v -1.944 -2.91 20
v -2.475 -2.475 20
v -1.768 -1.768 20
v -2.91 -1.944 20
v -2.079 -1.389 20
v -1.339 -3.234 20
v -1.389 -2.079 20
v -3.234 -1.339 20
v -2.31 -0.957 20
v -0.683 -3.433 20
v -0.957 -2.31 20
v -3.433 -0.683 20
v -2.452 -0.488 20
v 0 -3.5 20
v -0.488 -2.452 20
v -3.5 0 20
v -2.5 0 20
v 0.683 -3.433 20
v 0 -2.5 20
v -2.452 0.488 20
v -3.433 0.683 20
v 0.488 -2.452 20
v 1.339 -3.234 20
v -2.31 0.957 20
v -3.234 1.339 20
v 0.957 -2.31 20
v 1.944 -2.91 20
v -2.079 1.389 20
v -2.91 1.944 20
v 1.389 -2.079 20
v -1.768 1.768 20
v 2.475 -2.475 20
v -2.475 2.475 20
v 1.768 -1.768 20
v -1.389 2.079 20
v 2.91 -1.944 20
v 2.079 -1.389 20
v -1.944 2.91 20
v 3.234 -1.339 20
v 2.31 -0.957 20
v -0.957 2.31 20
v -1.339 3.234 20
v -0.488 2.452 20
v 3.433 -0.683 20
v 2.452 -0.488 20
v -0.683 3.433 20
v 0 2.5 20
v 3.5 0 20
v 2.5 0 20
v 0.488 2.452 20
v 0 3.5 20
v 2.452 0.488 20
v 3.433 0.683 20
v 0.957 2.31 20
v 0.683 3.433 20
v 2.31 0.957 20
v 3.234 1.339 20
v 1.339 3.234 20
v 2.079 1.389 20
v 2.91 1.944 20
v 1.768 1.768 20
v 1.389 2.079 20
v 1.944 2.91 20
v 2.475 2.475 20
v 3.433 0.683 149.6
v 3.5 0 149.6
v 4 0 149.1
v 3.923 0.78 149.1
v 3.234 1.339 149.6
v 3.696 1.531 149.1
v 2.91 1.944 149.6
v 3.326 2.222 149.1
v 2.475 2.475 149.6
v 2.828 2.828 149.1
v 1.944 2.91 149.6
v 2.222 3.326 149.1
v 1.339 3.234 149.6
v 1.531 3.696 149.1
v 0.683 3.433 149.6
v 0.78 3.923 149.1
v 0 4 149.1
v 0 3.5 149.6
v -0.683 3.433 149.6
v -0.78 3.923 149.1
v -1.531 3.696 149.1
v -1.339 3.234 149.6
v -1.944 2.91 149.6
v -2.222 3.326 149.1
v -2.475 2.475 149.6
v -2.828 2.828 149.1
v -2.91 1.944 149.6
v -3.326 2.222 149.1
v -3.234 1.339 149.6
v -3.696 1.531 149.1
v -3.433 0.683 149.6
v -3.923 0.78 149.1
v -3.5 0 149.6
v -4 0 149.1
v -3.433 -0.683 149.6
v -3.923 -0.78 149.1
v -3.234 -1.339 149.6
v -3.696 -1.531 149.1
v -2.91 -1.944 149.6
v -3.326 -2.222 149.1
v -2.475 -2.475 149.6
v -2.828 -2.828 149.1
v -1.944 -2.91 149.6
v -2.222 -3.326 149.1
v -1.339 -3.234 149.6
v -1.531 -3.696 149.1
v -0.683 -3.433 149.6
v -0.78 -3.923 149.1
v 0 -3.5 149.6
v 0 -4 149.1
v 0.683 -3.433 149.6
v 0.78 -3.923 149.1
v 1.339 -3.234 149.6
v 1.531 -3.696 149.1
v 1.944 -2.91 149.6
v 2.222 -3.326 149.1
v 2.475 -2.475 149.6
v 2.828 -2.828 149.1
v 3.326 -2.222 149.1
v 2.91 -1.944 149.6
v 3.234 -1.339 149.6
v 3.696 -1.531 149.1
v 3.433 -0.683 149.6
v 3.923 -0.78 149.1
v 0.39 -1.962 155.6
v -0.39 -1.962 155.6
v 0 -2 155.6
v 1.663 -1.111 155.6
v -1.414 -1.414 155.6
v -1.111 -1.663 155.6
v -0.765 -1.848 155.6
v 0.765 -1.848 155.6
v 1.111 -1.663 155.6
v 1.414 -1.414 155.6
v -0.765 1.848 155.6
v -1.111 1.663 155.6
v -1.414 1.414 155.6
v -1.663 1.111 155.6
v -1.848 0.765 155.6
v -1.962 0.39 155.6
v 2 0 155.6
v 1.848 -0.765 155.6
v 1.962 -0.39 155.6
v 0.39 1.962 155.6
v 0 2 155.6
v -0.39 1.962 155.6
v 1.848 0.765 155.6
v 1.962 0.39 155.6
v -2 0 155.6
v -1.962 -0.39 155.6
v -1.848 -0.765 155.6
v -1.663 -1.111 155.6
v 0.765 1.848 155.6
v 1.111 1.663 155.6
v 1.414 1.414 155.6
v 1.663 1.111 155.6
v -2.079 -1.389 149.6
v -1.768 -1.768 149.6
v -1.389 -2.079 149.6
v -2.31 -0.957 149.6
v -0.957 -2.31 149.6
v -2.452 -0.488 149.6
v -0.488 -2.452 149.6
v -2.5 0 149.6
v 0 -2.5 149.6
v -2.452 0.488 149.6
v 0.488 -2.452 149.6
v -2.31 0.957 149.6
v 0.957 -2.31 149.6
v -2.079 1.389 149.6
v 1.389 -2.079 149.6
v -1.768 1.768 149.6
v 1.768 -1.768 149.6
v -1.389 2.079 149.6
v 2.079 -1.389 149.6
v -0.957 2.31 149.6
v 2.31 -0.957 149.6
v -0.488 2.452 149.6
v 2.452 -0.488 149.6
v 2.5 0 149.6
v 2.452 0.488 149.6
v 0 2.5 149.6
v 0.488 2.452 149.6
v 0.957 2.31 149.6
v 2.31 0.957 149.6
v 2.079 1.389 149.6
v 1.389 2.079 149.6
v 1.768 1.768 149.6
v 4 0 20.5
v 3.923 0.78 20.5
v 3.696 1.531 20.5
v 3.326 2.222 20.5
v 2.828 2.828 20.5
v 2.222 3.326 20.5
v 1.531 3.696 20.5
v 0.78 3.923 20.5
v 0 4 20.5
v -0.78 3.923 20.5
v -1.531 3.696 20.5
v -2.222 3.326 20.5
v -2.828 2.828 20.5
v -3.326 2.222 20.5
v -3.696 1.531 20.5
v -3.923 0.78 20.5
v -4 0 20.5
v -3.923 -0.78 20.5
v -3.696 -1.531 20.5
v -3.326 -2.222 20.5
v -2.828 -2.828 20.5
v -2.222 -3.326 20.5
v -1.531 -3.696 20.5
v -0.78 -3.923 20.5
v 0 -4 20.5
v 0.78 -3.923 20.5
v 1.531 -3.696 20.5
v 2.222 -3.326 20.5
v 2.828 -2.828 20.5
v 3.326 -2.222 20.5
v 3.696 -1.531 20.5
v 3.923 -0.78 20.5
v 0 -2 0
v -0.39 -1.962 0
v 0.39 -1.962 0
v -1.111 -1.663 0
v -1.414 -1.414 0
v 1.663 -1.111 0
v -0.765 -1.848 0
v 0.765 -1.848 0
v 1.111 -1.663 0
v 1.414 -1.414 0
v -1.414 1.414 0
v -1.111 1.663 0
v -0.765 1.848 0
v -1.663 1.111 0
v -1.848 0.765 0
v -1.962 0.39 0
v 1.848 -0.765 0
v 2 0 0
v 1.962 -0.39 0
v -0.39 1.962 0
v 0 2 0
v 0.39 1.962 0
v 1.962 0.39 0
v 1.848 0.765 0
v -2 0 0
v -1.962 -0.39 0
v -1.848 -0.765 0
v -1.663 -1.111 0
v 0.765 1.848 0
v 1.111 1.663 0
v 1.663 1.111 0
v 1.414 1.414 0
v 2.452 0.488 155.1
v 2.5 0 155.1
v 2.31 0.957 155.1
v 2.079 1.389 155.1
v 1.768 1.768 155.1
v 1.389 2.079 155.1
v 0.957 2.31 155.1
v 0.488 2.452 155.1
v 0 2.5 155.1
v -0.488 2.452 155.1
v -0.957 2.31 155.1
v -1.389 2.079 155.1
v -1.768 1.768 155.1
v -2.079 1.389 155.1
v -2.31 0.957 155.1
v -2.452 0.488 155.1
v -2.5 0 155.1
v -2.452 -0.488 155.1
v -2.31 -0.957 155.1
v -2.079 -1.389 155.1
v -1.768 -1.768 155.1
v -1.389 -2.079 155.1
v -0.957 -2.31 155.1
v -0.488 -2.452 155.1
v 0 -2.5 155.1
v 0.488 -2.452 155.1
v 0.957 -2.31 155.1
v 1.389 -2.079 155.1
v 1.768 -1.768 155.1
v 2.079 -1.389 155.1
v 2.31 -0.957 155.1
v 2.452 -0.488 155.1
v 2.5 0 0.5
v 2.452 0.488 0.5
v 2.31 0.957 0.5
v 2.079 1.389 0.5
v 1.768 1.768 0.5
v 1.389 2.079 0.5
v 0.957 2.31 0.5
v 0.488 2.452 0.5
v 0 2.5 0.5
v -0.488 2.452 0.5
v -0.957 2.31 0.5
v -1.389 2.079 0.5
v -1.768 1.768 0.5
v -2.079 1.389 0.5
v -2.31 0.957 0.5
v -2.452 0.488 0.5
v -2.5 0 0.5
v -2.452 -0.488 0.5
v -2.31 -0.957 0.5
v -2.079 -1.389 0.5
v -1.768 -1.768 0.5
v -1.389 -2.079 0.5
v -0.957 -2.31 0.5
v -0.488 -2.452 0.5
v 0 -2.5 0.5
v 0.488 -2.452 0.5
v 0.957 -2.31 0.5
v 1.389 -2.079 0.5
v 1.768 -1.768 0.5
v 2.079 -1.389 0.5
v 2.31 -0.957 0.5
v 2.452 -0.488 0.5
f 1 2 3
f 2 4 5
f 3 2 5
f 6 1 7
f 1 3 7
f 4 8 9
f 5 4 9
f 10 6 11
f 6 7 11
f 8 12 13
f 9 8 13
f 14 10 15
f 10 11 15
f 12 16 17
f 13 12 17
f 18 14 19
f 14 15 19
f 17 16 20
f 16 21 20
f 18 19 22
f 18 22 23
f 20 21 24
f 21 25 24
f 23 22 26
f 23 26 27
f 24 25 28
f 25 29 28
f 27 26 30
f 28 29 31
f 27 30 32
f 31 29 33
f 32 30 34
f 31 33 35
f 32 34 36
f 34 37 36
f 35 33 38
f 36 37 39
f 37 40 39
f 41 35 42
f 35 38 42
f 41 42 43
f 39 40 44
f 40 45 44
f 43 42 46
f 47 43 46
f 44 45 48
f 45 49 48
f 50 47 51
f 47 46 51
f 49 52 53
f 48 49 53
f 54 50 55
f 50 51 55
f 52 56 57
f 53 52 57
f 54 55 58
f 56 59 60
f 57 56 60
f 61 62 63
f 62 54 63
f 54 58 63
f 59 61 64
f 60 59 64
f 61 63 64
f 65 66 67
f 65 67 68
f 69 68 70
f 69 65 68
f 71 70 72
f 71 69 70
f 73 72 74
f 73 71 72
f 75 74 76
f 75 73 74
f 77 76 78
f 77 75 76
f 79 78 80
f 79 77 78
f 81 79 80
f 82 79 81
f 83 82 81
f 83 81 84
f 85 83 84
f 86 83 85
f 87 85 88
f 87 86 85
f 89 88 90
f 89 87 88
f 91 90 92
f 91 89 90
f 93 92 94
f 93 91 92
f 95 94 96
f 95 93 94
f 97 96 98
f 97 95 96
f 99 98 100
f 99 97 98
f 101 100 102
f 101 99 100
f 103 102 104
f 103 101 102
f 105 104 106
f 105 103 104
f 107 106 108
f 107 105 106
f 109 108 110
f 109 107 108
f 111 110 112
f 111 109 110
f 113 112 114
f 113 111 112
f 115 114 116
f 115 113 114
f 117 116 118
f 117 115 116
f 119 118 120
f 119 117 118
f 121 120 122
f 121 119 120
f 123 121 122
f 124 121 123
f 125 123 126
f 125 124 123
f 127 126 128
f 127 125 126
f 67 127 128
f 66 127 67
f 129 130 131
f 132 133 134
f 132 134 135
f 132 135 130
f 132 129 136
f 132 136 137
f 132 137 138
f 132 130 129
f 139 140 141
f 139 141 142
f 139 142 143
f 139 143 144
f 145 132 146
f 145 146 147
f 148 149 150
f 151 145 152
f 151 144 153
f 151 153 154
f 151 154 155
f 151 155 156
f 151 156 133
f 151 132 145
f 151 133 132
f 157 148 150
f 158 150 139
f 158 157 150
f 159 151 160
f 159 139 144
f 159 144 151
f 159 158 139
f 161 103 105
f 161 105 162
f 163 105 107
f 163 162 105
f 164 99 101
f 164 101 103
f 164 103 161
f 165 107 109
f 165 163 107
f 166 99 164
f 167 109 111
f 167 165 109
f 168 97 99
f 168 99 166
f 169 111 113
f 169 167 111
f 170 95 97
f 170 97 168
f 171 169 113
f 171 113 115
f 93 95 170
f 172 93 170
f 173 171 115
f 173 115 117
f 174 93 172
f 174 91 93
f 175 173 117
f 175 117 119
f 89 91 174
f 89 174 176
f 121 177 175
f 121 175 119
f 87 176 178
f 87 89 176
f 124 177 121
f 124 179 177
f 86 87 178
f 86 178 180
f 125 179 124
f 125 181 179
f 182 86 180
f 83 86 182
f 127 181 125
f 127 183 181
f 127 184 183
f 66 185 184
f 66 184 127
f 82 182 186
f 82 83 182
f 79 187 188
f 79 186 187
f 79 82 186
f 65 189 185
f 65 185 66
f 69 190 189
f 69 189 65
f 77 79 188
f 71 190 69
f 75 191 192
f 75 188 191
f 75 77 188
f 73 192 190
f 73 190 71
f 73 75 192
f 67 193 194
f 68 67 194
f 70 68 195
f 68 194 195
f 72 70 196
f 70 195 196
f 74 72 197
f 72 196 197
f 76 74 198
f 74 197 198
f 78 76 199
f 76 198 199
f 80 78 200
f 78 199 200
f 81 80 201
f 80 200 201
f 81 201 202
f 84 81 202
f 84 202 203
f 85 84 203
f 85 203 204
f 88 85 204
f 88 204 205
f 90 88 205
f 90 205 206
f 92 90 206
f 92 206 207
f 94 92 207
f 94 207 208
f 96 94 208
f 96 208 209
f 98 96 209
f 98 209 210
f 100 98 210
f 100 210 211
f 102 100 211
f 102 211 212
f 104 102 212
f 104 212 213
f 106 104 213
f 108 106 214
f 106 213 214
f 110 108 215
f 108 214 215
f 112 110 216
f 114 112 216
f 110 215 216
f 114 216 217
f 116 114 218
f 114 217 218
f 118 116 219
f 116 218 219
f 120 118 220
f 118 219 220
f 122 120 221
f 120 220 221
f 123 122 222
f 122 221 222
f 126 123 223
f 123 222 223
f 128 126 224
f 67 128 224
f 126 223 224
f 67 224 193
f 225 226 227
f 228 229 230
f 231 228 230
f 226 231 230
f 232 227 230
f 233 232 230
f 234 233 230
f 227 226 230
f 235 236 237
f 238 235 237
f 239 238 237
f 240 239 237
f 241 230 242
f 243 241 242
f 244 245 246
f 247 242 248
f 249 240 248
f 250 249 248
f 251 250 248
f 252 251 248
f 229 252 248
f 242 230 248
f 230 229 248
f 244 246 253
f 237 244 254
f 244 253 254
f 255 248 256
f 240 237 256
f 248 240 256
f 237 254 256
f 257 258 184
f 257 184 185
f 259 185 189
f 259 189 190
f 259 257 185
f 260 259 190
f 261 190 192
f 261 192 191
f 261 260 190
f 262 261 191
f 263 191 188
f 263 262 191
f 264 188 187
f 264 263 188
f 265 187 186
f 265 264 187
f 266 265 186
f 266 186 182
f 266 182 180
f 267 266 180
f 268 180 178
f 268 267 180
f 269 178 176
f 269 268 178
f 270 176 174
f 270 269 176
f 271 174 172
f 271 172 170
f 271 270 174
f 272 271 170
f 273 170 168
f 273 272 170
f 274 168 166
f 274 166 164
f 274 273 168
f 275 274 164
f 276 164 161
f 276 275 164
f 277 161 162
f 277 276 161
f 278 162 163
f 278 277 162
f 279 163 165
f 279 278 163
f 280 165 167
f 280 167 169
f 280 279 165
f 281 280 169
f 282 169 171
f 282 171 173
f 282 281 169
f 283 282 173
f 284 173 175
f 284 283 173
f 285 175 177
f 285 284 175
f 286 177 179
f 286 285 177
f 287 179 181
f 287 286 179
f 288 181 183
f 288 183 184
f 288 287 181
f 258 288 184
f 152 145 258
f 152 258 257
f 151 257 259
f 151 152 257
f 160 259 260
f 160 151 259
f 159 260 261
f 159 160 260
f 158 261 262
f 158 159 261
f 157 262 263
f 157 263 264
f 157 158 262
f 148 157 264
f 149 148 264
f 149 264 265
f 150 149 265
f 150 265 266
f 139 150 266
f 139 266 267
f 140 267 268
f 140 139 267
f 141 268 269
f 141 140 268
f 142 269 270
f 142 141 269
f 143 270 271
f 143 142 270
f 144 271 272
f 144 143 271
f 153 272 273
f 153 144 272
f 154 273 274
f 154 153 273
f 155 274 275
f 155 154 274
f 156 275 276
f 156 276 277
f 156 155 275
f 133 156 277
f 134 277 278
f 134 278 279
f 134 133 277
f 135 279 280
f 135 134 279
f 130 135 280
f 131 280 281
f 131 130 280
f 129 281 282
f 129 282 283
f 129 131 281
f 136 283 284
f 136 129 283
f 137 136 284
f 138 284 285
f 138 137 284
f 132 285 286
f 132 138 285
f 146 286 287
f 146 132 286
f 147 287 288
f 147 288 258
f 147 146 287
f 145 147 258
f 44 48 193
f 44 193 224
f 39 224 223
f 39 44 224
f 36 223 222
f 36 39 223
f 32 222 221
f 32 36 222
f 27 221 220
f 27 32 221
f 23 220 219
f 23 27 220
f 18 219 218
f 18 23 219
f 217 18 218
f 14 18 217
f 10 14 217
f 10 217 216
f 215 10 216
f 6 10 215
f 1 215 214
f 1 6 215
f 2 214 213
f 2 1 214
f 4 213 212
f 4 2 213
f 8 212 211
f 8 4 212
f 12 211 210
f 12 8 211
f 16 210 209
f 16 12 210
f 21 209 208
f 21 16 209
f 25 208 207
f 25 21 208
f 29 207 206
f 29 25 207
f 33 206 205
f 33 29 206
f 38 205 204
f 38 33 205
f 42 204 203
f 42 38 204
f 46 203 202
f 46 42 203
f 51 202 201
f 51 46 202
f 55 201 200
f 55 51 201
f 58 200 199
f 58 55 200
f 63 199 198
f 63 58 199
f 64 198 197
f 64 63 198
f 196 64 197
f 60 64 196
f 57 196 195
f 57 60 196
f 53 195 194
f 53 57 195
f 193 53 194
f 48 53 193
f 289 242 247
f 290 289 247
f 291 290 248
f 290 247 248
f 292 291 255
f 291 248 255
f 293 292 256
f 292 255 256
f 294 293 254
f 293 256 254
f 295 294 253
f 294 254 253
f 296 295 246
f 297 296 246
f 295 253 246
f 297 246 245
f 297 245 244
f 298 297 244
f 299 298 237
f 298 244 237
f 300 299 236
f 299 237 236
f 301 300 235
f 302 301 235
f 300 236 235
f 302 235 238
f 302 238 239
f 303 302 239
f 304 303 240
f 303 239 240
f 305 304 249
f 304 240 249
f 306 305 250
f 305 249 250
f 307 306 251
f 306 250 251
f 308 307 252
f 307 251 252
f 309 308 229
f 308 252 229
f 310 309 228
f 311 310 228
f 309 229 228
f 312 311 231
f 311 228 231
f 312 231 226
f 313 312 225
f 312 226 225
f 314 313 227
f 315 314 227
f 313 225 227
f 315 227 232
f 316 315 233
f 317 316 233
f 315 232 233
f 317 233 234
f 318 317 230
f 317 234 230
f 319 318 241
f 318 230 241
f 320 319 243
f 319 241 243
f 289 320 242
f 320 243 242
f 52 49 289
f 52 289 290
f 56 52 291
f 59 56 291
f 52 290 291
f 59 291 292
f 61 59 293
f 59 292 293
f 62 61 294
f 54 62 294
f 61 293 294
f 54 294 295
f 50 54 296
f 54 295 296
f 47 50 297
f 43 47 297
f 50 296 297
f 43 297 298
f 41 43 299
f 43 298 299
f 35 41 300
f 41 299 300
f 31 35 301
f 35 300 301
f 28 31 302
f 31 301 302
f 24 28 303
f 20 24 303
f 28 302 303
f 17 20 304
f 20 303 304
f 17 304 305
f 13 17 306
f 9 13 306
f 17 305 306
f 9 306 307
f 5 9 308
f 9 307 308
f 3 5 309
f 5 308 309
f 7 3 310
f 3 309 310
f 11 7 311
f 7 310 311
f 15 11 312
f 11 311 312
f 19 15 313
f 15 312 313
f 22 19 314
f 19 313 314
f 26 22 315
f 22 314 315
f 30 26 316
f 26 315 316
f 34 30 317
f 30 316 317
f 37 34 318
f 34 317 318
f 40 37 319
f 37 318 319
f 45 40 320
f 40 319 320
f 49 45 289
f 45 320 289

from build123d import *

# Parameters (mm, degrees)
F0_R     = 4
F1_DEPTH = 155.6
F2_R     = 6.5
F2_R_2   = 2.5
F3_DEPTH = 20
F4_R     = 4
F4_R_2   = 2.5
F5_DEPTH = 6
F6_SIZE  = 0.5


with BuildPart() as f1:
    # F0 (on Top) → F1 (new body)
    with BuildSketch(Plane.XY):
        Circle(F0_R)
    extrude(amount=F1_DEPTH)

    # F2 (on Top) → F3 (cut)
    with BuildSketch(Plane.XY):
        Circle(F2_R)
        Circle(F2_R_2, mode=Mode.SUBTRACT)
    extrude(amount=F3_DEPTH, mode=Mode.SUBTRACT)

    # F4 (on face) → F5 (cut)
    with BuildSketch(Plane.XY.offset(155.6)):
        Circle(F4_R)
        Circle(F4_R_2, mode=Mode.SUBTRACT)
    extrude(amount=-F5_DEPTH, mode=Mode.SUBTRACT)

    # F6
    f6_edges = [f1.edges().sort_by_distance(p)[0] for p in [
        (-2.5, 0, 0),
        (-4, 0, 20),
        (-4, 0, 149.6),
        (-2.5, 0, 155.6),
    ]]
    chamfer(f6_edges, length=F6_SIZE)


solid = f1.part
